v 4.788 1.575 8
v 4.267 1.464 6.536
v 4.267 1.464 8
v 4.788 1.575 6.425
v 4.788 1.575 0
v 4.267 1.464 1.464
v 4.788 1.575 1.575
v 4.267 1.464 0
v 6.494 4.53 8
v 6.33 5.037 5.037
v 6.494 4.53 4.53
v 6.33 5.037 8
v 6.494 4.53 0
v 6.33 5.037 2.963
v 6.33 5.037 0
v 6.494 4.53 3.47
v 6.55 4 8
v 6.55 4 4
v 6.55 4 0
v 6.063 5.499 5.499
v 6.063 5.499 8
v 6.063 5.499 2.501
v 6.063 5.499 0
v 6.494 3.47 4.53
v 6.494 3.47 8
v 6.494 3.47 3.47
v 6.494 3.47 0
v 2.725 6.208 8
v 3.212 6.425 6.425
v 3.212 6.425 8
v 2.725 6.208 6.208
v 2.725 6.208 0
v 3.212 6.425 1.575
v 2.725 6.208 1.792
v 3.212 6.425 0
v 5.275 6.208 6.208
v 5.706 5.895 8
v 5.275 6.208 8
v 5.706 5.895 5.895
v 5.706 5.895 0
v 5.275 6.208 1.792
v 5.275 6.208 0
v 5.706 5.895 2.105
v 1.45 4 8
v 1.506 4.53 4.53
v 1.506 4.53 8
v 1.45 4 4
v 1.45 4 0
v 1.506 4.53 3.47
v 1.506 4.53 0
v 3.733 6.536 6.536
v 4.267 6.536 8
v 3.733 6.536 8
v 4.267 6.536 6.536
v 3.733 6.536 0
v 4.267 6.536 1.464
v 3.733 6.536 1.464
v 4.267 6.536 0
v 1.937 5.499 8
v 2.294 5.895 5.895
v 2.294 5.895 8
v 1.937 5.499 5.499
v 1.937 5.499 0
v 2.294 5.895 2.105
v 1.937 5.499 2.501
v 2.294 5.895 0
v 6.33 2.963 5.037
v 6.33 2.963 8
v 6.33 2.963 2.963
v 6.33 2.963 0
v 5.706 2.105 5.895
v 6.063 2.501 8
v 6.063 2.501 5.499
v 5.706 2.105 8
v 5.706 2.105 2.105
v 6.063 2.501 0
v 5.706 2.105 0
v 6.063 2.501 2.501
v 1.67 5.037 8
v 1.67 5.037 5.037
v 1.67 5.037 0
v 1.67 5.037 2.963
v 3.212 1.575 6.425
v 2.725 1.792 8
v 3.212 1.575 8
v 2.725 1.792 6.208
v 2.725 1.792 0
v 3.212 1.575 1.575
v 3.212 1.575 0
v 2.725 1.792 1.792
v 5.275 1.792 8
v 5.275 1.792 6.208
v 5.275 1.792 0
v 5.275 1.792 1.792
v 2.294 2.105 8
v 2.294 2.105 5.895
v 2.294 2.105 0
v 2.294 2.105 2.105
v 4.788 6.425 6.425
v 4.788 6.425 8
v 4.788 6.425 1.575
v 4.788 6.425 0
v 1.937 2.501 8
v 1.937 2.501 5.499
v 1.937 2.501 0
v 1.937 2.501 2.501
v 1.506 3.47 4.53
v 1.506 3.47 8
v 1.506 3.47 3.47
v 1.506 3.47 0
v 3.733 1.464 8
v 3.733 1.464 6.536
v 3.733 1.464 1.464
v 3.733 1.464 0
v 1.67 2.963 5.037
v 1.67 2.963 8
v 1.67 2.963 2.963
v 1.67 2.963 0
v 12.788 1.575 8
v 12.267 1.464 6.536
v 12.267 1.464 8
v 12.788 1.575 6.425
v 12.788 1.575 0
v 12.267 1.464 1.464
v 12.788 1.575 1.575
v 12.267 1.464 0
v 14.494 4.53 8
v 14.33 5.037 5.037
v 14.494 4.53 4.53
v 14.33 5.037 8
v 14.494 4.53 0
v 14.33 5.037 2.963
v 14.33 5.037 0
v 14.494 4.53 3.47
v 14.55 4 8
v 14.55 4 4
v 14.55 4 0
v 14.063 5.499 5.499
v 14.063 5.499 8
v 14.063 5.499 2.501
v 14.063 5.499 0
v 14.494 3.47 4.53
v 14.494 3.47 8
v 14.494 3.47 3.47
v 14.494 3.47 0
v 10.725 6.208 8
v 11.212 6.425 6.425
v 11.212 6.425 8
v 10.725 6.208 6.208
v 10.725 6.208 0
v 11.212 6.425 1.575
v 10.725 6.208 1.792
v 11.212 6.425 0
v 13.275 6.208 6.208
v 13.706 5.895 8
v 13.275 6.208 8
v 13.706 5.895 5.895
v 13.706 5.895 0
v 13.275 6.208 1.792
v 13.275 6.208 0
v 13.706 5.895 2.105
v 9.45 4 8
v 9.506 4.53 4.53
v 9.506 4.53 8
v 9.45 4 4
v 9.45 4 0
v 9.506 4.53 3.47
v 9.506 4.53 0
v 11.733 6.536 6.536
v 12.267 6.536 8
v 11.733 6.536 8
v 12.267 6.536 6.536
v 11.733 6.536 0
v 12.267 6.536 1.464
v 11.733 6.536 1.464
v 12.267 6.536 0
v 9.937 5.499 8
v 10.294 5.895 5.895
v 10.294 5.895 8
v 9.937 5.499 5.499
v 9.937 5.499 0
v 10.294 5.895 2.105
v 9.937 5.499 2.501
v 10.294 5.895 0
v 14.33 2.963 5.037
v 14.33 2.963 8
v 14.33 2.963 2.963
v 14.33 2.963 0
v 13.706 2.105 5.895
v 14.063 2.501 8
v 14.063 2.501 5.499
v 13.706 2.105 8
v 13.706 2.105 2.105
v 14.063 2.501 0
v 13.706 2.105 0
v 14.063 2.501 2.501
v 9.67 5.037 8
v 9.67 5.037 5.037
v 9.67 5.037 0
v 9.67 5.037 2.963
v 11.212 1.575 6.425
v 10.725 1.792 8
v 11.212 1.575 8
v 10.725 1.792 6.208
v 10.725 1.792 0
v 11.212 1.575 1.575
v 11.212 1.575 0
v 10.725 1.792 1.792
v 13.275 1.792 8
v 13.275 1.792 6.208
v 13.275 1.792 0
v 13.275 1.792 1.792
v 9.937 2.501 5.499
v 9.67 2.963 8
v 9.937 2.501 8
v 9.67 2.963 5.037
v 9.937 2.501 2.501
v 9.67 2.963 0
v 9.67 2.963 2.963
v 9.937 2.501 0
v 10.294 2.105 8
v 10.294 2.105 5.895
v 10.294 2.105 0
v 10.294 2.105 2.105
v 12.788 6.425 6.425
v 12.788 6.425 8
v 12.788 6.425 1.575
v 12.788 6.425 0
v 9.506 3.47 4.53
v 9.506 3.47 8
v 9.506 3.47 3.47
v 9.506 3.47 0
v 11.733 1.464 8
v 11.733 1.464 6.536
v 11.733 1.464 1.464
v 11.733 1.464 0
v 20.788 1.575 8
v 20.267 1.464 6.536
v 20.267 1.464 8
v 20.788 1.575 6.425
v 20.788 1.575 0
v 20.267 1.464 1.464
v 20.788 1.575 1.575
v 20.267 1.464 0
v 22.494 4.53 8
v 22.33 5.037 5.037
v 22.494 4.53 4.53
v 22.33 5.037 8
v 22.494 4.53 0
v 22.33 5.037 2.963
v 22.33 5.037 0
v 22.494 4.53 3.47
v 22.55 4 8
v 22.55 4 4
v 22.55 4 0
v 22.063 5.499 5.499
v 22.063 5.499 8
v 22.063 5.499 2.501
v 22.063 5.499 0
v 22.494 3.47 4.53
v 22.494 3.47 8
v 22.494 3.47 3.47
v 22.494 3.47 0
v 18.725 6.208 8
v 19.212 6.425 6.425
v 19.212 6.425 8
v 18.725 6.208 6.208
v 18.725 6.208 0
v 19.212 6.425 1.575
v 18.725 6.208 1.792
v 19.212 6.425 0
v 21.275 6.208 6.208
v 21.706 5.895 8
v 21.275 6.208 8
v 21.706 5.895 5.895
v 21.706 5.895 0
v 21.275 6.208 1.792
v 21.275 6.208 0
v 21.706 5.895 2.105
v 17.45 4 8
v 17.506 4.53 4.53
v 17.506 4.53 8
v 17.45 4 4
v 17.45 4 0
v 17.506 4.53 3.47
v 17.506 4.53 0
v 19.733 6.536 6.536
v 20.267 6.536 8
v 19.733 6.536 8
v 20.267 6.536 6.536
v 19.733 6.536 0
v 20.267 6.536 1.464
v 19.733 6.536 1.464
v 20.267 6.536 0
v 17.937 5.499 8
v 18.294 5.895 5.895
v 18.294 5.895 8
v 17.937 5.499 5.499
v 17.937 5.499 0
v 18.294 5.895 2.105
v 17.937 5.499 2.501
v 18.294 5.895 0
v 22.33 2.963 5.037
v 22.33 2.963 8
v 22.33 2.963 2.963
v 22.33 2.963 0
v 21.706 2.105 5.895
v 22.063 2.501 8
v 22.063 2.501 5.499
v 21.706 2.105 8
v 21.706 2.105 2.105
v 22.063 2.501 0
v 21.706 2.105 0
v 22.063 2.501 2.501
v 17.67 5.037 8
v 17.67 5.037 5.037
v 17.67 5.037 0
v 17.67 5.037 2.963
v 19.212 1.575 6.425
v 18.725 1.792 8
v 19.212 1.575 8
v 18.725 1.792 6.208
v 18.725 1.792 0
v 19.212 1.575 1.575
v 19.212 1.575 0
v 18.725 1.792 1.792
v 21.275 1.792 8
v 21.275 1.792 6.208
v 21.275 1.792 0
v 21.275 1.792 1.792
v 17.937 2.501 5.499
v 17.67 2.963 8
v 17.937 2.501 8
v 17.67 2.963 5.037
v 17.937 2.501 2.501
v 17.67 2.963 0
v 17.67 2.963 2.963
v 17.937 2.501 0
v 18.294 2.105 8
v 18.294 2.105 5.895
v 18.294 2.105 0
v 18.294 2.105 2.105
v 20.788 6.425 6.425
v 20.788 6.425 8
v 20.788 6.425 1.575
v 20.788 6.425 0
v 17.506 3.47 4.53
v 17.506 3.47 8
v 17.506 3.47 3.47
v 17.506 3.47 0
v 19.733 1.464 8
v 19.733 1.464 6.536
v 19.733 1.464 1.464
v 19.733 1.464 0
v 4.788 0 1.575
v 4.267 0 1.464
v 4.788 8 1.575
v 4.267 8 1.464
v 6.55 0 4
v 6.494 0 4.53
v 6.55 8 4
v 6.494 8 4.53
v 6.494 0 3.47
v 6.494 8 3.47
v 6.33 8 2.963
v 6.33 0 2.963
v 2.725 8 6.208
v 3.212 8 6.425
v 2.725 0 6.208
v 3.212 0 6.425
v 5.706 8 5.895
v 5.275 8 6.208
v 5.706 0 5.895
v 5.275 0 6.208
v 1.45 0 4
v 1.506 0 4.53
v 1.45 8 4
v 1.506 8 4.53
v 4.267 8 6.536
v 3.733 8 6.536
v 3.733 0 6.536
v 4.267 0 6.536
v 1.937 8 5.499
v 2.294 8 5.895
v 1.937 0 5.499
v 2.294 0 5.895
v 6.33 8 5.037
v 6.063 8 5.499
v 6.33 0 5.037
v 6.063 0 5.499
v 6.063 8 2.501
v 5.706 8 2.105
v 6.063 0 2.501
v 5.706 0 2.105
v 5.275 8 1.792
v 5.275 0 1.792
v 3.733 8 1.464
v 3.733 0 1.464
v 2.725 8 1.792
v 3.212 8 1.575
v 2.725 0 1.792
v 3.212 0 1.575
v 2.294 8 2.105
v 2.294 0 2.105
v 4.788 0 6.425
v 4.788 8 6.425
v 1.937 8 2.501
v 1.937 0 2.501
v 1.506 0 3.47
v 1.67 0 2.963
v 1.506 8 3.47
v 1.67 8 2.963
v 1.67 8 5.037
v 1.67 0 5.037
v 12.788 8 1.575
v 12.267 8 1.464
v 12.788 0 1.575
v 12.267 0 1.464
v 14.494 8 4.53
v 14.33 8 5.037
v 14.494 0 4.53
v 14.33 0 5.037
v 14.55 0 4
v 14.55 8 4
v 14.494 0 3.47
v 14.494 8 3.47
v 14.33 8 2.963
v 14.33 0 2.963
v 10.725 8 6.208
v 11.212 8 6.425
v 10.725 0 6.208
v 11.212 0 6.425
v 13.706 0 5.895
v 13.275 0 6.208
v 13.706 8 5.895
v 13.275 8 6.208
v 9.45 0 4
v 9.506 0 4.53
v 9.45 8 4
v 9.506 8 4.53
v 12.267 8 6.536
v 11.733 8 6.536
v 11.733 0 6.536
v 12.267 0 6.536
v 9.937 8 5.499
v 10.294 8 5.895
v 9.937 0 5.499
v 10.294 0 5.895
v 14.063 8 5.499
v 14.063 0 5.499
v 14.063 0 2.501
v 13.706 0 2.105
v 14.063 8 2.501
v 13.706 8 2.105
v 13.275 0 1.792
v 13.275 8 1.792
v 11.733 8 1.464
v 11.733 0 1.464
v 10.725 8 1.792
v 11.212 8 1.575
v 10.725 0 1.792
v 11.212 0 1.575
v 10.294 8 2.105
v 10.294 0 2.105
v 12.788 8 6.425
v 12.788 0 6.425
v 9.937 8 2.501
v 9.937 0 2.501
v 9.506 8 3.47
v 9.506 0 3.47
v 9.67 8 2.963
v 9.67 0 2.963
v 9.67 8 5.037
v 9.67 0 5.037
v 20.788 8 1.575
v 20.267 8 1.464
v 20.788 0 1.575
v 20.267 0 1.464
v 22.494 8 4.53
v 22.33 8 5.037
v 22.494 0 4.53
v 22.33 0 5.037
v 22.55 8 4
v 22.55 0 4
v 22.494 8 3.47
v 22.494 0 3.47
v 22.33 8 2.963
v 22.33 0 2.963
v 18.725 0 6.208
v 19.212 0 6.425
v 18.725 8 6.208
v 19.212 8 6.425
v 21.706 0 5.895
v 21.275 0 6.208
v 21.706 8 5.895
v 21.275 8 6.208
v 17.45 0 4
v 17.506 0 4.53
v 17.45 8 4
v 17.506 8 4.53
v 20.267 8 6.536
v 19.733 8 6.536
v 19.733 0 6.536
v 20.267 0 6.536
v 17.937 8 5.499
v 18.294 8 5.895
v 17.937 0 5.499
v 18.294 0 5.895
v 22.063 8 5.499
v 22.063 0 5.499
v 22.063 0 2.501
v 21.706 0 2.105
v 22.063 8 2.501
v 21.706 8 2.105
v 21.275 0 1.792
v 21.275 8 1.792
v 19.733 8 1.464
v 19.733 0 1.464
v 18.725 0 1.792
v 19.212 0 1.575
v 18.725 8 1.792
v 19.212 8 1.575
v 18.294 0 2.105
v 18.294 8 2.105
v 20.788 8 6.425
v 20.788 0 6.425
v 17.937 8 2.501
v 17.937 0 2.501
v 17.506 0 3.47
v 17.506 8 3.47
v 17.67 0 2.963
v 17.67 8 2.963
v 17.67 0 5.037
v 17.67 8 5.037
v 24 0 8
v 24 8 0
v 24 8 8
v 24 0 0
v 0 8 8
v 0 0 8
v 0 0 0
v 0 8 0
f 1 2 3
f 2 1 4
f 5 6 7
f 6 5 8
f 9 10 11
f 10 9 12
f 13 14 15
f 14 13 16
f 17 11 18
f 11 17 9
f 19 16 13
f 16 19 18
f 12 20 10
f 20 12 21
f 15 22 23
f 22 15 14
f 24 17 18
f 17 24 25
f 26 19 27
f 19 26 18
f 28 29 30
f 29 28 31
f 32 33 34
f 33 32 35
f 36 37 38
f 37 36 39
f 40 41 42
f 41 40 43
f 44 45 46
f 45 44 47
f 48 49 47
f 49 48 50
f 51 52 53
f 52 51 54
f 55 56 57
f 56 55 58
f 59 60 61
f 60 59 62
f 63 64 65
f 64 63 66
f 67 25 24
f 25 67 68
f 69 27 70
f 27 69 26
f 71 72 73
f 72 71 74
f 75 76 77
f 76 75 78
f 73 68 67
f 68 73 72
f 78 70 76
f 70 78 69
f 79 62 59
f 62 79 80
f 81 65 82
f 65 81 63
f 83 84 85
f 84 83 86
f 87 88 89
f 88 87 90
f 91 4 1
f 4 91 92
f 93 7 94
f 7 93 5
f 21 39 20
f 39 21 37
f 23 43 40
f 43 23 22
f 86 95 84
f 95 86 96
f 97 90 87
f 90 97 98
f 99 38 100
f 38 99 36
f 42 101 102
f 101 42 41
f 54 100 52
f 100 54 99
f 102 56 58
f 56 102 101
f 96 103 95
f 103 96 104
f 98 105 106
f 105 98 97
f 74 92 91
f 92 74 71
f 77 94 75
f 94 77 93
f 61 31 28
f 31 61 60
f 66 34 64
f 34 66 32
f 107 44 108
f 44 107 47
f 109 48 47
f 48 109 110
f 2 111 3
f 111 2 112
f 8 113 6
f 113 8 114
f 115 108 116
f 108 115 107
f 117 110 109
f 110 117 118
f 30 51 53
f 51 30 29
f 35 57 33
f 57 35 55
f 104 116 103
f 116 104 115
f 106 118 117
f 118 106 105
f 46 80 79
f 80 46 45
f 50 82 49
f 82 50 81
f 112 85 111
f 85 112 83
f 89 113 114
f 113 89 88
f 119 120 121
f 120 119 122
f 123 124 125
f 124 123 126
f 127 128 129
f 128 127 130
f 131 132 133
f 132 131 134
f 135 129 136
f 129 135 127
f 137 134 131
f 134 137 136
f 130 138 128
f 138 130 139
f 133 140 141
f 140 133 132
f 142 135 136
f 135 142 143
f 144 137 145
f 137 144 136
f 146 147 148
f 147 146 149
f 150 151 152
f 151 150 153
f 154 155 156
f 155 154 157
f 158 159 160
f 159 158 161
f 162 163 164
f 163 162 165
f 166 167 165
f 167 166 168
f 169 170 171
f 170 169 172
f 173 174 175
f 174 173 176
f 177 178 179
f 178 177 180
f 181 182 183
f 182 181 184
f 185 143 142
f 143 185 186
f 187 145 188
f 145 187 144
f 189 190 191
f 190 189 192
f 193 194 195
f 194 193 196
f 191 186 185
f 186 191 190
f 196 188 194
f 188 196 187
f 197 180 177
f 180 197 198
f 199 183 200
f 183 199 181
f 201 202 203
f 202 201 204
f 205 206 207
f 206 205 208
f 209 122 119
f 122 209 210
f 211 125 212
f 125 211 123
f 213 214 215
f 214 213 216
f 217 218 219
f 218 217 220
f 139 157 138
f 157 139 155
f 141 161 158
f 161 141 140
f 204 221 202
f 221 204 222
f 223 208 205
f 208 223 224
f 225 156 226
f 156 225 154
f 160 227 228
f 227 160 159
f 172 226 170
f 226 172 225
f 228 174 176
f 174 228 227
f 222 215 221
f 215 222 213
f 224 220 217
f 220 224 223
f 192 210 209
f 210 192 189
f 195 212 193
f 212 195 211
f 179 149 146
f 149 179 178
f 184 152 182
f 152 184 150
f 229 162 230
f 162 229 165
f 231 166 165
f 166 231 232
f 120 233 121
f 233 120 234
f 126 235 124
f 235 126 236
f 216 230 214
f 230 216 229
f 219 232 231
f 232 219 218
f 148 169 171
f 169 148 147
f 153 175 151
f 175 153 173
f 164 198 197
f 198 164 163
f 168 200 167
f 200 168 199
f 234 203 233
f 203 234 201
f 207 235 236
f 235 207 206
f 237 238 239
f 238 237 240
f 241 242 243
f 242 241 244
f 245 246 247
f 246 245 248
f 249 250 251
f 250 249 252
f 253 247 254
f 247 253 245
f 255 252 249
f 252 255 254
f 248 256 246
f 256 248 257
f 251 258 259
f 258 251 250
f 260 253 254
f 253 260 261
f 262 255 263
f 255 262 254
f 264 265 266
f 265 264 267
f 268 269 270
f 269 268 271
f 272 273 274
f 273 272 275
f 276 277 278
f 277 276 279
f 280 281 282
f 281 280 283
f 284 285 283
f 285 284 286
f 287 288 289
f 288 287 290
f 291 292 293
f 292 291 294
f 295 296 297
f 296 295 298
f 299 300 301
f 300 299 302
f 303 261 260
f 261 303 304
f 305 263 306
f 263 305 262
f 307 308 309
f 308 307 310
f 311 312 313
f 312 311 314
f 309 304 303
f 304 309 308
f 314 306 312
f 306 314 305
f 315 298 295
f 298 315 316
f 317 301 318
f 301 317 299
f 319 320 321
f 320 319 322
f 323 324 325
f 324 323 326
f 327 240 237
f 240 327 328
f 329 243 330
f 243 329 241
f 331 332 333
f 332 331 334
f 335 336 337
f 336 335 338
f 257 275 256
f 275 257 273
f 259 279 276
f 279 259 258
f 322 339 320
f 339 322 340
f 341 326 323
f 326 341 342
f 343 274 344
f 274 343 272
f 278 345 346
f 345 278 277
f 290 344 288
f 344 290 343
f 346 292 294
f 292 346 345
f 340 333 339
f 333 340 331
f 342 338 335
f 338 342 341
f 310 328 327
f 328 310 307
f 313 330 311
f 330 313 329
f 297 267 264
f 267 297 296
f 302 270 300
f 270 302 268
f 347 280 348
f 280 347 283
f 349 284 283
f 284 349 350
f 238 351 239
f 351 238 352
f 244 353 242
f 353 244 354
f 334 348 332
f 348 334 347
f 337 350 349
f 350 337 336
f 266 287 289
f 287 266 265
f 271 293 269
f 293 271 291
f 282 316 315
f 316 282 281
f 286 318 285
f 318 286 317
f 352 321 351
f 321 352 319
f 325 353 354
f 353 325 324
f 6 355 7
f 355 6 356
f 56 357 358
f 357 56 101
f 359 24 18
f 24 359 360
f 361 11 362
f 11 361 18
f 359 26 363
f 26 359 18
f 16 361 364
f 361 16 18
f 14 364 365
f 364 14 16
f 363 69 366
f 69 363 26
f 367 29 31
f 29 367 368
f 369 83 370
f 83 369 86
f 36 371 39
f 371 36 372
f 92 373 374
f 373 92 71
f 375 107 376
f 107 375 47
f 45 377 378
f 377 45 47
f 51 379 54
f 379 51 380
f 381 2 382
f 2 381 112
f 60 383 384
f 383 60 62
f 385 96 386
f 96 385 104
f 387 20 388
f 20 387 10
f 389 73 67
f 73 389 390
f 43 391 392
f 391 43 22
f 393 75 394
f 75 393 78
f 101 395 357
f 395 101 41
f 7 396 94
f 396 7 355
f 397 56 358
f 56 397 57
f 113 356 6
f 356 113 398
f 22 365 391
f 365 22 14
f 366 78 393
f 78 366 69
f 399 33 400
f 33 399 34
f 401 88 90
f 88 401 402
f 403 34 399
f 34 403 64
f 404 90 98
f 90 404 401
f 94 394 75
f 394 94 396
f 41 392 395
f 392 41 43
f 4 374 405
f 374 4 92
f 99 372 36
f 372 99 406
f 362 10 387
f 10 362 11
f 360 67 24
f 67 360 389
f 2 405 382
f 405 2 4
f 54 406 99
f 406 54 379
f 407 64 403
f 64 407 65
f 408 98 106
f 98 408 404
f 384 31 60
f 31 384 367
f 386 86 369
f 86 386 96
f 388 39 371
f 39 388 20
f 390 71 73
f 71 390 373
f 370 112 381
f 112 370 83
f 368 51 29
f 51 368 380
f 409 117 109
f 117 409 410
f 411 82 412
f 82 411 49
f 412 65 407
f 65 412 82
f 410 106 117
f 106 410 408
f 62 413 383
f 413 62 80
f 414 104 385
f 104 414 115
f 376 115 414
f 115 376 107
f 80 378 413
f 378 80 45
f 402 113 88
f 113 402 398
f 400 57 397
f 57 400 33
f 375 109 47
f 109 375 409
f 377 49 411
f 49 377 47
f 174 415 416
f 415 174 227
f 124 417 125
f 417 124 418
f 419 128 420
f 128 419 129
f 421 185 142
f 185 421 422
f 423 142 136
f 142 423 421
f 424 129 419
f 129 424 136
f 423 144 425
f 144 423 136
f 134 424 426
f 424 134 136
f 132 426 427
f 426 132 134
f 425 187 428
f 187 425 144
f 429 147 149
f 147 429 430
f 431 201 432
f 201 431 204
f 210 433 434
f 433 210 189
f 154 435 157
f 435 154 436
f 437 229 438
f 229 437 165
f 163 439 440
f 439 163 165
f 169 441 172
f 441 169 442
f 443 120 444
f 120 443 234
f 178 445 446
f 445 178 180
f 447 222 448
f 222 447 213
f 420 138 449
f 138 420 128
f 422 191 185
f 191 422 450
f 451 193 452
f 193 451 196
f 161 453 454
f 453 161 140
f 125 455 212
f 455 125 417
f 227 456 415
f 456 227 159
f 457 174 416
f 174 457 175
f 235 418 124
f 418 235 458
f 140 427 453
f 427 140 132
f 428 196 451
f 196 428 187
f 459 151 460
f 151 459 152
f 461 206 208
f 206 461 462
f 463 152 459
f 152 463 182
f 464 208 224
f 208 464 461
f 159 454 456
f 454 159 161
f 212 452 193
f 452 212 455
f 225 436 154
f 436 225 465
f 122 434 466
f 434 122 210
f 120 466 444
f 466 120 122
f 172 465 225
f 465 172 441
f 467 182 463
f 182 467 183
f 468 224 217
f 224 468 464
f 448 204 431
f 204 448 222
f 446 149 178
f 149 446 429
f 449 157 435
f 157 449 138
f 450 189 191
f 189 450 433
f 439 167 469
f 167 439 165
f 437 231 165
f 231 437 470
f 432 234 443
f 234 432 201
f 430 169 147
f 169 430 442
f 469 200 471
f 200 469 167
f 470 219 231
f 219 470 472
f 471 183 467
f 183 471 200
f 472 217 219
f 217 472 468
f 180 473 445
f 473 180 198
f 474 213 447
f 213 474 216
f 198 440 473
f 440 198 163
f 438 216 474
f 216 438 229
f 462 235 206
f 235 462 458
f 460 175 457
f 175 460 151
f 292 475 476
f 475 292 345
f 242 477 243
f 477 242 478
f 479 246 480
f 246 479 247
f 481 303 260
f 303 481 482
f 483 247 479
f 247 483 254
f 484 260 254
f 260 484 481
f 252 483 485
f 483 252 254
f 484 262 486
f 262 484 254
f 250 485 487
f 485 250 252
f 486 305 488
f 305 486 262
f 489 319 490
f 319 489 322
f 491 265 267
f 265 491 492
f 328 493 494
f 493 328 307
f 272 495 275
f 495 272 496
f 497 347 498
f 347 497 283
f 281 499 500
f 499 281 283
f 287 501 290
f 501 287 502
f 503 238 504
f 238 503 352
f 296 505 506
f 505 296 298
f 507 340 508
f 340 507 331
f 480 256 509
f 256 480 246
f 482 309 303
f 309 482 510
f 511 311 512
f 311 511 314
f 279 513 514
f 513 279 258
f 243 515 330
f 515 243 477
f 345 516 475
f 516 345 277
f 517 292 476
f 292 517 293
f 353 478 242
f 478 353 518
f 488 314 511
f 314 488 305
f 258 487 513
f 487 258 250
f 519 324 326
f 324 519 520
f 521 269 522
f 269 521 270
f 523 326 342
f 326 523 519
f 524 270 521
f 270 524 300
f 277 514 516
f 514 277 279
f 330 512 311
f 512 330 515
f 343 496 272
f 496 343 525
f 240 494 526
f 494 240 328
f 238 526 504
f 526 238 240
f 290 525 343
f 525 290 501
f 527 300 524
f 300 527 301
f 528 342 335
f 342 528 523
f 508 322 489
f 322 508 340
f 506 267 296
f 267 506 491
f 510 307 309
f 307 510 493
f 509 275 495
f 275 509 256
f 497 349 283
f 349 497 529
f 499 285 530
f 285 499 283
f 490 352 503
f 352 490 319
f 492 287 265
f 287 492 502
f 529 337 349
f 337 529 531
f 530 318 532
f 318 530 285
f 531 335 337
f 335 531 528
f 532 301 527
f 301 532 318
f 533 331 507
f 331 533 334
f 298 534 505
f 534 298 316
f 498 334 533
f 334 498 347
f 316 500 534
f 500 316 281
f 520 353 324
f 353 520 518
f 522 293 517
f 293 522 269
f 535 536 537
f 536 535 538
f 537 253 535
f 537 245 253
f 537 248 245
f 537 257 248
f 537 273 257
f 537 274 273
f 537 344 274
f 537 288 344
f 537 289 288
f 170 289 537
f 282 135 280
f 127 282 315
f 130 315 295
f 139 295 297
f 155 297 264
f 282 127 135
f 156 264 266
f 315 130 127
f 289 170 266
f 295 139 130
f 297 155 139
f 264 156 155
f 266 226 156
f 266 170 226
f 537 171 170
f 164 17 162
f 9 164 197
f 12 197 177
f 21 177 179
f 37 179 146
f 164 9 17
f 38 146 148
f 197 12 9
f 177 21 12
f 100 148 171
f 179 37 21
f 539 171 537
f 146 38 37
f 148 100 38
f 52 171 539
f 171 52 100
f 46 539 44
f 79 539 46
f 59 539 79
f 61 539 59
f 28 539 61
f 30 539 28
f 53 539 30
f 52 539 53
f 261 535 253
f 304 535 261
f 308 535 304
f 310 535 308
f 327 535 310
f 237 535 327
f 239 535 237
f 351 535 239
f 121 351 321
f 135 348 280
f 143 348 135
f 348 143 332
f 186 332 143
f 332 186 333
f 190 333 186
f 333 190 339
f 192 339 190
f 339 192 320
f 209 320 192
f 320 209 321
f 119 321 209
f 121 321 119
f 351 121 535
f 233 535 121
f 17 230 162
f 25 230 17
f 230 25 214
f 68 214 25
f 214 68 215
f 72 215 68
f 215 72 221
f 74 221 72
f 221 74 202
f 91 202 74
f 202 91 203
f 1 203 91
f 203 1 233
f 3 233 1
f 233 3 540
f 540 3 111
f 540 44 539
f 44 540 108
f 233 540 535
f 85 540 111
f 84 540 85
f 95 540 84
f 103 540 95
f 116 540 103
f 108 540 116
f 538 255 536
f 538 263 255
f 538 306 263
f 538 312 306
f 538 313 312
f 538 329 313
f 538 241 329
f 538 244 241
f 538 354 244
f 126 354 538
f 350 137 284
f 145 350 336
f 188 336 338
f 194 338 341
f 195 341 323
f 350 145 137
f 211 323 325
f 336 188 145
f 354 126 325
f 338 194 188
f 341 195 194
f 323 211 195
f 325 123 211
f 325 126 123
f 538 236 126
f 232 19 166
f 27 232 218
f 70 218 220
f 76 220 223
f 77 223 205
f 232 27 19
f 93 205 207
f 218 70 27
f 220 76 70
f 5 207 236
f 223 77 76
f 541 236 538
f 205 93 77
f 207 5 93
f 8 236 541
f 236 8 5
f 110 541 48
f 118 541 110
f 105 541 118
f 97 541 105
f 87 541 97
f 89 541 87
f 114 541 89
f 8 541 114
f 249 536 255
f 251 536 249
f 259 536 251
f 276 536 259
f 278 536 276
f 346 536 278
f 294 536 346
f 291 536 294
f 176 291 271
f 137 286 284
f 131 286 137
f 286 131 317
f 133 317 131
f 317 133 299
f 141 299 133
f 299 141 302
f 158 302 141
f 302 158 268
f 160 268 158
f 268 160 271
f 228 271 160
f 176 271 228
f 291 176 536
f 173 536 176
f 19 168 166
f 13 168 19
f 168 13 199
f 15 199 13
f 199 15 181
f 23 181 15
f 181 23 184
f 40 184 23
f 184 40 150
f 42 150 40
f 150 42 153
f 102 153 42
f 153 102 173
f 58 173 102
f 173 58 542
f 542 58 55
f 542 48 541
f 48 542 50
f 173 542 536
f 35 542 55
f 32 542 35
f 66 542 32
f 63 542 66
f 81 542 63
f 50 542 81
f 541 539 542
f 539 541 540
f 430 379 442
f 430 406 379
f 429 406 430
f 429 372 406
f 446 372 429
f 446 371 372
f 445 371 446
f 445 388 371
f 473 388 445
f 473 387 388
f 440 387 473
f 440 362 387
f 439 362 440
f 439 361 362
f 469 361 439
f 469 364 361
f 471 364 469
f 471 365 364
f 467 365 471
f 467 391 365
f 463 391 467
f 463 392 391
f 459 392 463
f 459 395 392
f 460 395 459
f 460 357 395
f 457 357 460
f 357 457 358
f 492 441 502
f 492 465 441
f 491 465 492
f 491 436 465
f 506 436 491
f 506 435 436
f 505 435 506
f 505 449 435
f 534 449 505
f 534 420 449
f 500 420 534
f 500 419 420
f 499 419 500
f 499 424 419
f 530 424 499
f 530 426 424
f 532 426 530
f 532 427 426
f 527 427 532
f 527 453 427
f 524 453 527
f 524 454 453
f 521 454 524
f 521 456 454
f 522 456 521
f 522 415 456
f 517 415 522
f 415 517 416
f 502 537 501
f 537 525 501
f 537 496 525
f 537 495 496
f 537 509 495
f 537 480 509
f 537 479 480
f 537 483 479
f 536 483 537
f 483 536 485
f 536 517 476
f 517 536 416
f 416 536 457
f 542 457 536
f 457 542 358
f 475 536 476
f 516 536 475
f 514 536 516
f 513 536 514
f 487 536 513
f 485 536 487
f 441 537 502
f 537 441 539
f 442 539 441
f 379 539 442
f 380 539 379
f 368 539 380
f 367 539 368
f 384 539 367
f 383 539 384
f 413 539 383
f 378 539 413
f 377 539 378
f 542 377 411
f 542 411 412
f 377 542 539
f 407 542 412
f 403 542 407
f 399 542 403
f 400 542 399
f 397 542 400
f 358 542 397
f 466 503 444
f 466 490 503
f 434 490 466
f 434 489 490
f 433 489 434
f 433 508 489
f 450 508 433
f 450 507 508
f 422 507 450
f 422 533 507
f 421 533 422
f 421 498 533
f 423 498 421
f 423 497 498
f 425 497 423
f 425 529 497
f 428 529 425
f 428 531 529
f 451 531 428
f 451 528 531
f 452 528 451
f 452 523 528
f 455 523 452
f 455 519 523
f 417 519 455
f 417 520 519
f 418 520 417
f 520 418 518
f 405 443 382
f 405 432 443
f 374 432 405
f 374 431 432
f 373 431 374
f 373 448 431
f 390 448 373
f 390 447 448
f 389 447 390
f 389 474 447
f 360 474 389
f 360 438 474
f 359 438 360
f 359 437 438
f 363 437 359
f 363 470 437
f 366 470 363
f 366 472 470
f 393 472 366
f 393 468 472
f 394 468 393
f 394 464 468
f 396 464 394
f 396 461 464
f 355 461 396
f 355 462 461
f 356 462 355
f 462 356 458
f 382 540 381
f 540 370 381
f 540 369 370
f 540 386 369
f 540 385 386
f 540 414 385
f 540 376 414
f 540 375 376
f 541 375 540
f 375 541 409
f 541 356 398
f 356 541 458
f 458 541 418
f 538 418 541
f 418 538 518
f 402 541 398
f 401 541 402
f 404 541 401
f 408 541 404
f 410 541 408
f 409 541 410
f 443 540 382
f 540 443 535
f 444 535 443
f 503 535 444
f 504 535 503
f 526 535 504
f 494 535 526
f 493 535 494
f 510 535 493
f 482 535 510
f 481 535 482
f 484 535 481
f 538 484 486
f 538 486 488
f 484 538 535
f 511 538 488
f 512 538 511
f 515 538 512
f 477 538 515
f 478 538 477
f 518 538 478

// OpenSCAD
// Description: "LEGO Technic-compatible gridbeam"
// Project home: http://bitbeam.org

// Each bitbeam is 8mm inches wide. 
// Center of each hole is 8mm apart from each other
// Holes are 5.1 mm in diameter.

// Mini
//beam_width     = 4;
//hole_diameter  = 2.2;

// Standard
beam_width     = 8;
hole_diameter  = 5.1;

hole_radius    = hole_diameter / 2;

module beam(number_of_holes) {
	beam_length = number_of_holes * beam_width;
	difference() {
		// Draw the beam...
		cube([beam_length,beam_width,beam_width]);
    
            // Cut the holes...
		for (x=[beam_width/2 : beam_width : beam_length]) {
			translate([x,beam_width/2,-2])
			cylinder(r=hole_radius, h=12, $fn=30);
         }
		for (x=[beam_width/2 : beam_width : beam_length]) {
			rotate([90,0,0])
			translate([x,beam_width/2,-10])
			cylinder(r=hole_radius, h=12, $fn=30);
         }
        
        // Optional through-hole
		//rotate([0,90,0])
		//translate([-4,beam_width/2,-2])
		//cylinder(r=hole_radius, h=number_of_holes*beam_width+4, $fn=30);
        }
}

beam(3);
